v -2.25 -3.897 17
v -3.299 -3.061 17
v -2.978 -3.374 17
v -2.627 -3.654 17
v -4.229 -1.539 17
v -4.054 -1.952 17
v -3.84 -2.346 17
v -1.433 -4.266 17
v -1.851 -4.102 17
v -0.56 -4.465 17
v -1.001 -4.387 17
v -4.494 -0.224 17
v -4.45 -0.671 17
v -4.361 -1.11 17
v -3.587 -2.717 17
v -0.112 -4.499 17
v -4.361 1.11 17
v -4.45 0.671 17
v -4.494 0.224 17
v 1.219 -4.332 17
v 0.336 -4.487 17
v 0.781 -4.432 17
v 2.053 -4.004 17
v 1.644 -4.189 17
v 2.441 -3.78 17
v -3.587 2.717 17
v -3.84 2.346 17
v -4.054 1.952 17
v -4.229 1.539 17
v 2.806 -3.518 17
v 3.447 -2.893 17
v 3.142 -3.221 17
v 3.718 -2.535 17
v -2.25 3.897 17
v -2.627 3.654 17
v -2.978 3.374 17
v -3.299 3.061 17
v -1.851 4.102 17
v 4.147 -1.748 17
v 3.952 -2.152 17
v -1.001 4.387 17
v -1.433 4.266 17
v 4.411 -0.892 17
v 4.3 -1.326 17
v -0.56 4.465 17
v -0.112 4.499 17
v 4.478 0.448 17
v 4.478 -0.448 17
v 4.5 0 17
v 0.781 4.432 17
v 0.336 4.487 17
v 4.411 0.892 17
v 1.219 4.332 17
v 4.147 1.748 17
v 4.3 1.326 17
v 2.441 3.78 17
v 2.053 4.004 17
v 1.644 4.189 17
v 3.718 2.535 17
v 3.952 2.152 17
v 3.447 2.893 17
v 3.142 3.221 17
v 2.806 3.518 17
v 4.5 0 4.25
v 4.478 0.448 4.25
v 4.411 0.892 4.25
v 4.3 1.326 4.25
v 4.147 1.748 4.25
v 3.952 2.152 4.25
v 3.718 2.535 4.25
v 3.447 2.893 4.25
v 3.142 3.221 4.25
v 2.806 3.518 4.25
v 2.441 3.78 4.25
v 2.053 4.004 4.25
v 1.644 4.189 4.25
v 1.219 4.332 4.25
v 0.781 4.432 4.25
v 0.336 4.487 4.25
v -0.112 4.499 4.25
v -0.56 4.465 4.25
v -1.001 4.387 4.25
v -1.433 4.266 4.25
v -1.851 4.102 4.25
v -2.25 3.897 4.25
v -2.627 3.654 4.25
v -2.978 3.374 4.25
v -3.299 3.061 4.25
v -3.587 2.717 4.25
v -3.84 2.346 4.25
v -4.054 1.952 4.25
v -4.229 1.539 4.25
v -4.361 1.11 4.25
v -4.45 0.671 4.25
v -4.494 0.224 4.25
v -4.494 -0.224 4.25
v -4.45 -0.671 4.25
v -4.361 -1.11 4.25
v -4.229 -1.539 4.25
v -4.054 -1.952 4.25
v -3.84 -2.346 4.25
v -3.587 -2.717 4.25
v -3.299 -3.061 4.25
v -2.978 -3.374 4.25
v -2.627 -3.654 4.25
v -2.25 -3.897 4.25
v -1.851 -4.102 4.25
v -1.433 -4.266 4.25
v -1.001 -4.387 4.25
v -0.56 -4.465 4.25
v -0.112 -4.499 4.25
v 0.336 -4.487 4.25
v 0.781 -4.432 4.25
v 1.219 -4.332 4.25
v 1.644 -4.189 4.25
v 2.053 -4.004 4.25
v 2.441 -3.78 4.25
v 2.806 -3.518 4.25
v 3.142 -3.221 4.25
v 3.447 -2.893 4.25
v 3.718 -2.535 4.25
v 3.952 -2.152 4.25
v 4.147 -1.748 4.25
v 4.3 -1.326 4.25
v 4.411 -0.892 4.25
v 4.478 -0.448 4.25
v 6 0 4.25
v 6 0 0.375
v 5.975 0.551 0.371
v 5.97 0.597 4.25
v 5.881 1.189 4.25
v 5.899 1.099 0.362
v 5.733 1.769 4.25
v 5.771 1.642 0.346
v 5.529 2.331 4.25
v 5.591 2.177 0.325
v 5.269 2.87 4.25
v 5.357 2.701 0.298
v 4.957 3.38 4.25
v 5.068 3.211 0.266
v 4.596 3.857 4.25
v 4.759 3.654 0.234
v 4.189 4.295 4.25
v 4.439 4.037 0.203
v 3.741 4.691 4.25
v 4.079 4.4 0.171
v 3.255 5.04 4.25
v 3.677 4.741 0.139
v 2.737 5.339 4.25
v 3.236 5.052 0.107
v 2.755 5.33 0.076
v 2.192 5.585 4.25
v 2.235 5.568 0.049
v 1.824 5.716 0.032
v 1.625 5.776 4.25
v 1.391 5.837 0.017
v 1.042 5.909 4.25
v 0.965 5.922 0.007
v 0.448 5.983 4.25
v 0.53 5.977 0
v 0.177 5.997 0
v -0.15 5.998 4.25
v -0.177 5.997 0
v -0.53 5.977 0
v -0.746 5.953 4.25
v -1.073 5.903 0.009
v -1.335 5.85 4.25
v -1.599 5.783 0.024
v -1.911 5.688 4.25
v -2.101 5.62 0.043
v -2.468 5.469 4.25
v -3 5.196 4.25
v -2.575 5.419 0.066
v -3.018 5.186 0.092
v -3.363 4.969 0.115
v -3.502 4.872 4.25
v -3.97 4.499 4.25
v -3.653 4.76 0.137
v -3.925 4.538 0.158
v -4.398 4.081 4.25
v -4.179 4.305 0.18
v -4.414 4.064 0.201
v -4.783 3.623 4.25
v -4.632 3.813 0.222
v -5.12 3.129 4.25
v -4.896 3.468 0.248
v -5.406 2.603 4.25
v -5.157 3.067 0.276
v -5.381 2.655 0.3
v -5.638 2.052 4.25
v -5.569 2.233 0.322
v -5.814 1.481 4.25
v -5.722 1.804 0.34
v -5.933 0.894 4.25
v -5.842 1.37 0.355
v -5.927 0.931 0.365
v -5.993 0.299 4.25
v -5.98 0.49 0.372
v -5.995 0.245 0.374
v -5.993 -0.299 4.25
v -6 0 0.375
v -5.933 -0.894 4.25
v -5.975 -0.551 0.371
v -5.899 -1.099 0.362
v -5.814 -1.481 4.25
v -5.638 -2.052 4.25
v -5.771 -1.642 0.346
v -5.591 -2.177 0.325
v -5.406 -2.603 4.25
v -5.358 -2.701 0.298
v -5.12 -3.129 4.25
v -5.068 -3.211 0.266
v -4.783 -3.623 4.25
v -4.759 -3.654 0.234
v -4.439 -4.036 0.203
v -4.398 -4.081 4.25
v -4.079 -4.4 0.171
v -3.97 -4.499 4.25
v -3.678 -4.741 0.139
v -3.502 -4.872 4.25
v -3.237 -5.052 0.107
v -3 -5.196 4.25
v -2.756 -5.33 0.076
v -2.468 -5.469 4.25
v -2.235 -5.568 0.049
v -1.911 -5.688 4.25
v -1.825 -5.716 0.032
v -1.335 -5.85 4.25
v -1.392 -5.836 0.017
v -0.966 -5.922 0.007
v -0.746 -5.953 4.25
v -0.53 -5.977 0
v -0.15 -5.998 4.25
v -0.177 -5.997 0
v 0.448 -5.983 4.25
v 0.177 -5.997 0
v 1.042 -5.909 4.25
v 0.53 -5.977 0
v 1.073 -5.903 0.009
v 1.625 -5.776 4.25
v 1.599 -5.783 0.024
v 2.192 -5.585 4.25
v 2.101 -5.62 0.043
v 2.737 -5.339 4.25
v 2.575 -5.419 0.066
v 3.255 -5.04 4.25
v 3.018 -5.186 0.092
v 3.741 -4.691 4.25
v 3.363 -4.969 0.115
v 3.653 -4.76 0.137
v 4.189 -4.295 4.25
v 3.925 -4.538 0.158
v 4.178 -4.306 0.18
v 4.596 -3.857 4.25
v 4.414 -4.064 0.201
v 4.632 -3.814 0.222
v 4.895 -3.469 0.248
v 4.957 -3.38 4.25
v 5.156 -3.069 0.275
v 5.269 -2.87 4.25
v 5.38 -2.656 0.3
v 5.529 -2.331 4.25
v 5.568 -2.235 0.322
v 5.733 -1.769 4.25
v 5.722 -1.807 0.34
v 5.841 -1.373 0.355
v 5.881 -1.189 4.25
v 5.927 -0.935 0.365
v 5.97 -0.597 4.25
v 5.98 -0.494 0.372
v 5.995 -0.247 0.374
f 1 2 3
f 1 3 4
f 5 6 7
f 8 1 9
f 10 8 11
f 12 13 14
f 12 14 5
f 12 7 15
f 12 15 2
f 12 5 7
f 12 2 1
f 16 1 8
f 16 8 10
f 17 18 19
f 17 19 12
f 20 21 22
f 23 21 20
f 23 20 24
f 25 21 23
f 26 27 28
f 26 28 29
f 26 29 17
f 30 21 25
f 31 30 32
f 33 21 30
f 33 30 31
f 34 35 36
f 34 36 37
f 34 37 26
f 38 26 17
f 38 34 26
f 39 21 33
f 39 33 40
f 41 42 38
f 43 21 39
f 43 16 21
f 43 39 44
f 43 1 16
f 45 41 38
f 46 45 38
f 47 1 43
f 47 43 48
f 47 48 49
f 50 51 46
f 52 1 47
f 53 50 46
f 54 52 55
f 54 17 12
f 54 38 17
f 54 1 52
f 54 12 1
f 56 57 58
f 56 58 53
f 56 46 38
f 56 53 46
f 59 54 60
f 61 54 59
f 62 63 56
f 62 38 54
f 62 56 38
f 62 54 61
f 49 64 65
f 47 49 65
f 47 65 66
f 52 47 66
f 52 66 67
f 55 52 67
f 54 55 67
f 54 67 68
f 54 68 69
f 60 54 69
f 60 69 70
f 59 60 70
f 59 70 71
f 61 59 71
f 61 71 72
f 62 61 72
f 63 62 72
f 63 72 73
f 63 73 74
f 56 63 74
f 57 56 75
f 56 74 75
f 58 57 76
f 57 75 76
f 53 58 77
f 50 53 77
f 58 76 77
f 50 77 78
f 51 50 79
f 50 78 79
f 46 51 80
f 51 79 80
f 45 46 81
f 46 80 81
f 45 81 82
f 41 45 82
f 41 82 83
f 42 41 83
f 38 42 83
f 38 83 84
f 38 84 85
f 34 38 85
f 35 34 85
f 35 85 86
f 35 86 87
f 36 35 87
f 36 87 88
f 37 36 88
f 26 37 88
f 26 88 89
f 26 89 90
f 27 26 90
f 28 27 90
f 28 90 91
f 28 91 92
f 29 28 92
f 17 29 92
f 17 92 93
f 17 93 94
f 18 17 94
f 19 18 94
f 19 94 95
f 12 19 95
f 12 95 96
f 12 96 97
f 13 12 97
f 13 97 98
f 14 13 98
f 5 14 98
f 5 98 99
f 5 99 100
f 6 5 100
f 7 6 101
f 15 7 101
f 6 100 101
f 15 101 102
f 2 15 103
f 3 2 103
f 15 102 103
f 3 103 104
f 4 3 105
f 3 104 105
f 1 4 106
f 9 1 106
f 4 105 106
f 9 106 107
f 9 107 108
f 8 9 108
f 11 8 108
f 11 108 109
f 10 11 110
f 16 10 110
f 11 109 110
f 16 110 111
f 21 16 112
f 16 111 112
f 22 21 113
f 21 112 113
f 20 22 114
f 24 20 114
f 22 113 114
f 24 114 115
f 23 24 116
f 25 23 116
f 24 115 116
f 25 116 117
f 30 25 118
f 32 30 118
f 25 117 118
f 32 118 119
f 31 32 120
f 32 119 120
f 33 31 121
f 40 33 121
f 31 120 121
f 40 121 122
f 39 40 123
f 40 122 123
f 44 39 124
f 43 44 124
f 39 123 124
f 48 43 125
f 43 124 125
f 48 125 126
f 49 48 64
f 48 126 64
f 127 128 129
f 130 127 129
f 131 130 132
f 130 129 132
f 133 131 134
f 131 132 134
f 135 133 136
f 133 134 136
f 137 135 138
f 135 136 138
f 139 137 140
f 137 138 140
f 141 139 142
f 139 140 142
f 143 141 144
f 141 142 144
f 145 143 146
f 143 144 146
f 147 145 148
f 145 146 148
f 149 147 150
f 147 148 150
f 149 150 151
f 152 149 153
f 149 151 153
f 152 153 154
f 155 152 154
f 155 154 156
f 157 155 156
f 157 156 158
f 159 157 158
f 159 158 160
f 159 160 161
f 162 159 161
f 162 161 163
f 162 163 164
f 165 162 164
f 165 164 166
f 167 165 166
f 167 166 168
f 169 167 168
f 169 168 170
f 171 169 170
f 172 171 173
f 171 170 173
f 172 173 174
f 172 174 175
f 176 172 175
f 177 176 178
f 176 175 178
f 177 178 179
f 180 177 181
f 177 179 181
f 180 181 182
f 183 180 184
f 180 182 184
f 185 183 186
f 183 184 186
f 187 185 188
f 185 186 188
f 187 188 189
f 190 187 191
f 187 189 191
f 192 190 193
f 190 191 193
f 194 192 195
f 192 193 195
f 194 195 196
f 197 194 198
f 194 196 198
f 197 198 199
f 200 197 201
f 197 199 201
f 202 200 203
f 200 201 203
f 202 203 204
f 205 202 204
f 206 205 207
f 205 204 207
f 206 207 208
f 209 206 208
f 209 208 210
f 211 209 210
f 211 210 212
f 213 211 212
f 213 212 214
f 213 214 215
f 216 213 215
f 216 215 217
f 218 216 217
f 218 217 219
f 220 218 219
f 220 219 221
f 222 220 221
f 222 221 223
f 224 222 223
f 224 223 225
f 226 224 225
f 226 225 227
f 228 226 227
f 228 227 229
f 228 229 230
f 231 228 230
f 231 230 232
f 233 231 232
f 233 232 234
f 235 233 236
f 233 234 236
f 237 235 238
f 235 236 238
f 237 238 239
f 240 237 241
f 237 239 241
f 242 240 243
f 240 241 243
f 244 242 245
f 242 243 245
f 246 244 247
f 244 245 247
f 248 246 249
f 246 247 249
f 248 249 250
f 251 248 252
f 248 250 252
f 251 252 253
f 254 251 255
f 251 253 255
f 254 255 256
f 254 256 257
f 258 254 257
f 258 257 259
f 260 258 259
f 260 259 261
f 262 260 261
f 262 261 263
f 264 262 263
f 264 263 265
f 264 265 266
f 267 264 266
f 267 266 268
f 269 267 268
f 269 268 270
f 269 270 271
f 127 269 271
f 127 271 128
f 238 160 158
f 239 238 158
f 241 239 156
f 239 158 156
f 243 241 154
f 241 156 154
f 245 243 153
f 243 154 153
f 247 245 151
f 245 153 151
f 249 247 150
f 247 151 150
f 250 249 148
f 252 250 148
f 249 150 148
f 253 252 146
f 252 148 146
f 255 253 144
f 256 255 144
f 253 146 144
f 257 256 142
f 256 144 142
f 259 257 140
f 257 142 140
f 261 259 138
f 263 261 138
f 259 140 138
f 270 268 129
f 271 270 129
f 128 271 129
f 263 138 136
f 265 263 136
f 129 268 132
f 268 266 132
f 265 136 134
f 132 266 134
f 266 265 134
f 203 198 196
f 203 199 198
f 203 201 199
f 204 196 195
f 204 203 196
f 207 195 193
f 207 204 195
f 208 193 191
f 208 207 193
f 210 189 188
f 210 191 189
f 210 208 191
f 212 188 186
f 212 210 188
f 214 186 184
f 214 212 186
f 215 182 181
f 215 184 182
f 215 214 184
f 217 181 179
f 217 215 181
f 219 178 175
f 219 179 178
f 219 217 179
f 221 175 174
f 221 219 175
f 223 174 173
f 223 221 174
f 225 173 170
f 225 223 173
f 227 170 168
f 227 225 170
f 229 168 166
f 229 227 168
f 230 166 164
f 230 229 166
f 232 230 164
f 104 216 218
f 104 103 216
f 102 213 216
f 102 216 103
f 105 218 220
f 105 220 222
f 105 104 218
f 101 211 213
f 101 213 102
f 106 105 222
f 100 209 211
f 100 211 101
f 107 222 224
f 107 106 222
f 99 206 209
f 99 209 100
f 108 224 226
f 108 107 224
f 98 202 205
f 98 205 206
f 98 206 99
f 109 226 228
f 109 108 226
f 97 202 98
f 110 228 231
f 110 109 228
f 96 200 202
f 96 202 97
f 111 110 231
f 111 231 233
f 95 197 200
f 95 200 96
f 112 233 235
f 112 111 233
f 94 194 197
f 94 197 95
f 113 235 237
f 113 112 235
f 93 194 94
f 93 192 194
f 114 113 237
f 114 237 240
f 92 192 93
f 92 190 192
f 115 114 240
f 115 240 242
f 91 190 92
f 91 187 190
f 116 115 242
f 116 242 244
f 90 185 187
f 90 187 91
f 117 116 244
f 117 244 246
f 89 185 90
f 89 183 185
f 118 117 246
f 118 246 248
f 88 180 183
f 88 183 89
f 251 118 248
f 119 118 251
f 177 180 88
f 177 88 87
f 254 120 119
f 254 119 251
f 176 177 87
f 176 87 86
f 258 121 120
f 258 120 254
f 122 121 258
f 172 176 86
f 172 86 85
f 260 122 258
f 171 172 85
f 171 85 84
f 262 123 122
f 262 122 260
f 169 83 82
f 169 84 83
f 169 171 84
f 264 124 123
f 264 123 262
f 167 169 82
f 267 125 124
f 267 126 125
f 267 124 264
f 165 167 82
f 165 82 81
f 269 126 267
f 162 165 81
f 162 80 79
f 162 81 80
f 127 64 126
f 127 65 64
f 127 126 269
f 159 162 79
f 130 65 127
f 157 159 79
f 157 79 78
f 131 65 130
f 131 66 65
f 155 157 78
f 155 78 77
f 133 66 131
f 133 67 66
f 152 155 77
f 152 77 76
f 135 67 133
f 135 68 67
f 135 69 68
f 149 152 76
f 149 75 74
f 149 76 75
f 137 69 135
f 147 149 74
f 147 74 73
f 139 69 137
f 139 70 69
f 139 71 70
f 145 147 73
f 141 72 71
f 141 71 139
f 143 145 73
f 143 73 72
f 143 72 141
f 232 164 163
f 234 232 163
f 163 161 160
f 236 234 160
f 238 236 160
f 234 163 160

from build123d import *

# Parameters (mm, degrees)
SKETCH1_R           = 4.5
BOSS_EXTRUDE1_DEPTH = 17
SKETCH1_4_R         = 6
SKETCH1_4_R_2       = 4.5
BOSS_EXTRUDE2_DEPTH = 4.25
CUT_EXTRUDE1_DEPTH  = 6


with BuildPart() as part:
    # Sketch1 → Boss-Extrude1 (new body)
    with BuildSketch(Plane.XY):
        Circle(SKETCH1_R)
    extrude(amount=BOSS_EXTRUDE1_DEPTH)

    # Sketch1<4> → Boss-Extrude2 (add)
    with BuildSketch(Plane.XY):
        Circle(SKETCH1_4_R)
        Circle(SKETCH1_4_R_2, mode=Mode.SUBTRACT)
    extrude(amount=BOSS_EXTRUDE2_DEPTH)

    # Sketch2 → Cut-Extrude1 (cut, symmetric)
    with BuildSketch(Plane(origin=(0, 0, 0), x_dir=(1, 0, 0), z_dir=(0, 1, 0))):
        with BuildLine():
            Line((-6, 0), (-6, -0.37451045))
            ThreePointArc((-6, -0.37451045), (-3.27018436, -0.108880819), (-0.529637427, 0))
            Line((-0.529637427, 0), (-6, 0))
        make_face()
        with BuildLine():
            Line((6, 0), (0.529637427, 0))
            ThreePointArc((0.529637427, 0), (3.27018436, -0.108880819), (6, -0.37451045))
            Line((6, -0.37451045), (6, 0))
        make_face()
    extrude(amount=CUT_EXTRUDE1_DEPTH, both=True, mode=Mode.SUBTRACT)


solid = part.part
